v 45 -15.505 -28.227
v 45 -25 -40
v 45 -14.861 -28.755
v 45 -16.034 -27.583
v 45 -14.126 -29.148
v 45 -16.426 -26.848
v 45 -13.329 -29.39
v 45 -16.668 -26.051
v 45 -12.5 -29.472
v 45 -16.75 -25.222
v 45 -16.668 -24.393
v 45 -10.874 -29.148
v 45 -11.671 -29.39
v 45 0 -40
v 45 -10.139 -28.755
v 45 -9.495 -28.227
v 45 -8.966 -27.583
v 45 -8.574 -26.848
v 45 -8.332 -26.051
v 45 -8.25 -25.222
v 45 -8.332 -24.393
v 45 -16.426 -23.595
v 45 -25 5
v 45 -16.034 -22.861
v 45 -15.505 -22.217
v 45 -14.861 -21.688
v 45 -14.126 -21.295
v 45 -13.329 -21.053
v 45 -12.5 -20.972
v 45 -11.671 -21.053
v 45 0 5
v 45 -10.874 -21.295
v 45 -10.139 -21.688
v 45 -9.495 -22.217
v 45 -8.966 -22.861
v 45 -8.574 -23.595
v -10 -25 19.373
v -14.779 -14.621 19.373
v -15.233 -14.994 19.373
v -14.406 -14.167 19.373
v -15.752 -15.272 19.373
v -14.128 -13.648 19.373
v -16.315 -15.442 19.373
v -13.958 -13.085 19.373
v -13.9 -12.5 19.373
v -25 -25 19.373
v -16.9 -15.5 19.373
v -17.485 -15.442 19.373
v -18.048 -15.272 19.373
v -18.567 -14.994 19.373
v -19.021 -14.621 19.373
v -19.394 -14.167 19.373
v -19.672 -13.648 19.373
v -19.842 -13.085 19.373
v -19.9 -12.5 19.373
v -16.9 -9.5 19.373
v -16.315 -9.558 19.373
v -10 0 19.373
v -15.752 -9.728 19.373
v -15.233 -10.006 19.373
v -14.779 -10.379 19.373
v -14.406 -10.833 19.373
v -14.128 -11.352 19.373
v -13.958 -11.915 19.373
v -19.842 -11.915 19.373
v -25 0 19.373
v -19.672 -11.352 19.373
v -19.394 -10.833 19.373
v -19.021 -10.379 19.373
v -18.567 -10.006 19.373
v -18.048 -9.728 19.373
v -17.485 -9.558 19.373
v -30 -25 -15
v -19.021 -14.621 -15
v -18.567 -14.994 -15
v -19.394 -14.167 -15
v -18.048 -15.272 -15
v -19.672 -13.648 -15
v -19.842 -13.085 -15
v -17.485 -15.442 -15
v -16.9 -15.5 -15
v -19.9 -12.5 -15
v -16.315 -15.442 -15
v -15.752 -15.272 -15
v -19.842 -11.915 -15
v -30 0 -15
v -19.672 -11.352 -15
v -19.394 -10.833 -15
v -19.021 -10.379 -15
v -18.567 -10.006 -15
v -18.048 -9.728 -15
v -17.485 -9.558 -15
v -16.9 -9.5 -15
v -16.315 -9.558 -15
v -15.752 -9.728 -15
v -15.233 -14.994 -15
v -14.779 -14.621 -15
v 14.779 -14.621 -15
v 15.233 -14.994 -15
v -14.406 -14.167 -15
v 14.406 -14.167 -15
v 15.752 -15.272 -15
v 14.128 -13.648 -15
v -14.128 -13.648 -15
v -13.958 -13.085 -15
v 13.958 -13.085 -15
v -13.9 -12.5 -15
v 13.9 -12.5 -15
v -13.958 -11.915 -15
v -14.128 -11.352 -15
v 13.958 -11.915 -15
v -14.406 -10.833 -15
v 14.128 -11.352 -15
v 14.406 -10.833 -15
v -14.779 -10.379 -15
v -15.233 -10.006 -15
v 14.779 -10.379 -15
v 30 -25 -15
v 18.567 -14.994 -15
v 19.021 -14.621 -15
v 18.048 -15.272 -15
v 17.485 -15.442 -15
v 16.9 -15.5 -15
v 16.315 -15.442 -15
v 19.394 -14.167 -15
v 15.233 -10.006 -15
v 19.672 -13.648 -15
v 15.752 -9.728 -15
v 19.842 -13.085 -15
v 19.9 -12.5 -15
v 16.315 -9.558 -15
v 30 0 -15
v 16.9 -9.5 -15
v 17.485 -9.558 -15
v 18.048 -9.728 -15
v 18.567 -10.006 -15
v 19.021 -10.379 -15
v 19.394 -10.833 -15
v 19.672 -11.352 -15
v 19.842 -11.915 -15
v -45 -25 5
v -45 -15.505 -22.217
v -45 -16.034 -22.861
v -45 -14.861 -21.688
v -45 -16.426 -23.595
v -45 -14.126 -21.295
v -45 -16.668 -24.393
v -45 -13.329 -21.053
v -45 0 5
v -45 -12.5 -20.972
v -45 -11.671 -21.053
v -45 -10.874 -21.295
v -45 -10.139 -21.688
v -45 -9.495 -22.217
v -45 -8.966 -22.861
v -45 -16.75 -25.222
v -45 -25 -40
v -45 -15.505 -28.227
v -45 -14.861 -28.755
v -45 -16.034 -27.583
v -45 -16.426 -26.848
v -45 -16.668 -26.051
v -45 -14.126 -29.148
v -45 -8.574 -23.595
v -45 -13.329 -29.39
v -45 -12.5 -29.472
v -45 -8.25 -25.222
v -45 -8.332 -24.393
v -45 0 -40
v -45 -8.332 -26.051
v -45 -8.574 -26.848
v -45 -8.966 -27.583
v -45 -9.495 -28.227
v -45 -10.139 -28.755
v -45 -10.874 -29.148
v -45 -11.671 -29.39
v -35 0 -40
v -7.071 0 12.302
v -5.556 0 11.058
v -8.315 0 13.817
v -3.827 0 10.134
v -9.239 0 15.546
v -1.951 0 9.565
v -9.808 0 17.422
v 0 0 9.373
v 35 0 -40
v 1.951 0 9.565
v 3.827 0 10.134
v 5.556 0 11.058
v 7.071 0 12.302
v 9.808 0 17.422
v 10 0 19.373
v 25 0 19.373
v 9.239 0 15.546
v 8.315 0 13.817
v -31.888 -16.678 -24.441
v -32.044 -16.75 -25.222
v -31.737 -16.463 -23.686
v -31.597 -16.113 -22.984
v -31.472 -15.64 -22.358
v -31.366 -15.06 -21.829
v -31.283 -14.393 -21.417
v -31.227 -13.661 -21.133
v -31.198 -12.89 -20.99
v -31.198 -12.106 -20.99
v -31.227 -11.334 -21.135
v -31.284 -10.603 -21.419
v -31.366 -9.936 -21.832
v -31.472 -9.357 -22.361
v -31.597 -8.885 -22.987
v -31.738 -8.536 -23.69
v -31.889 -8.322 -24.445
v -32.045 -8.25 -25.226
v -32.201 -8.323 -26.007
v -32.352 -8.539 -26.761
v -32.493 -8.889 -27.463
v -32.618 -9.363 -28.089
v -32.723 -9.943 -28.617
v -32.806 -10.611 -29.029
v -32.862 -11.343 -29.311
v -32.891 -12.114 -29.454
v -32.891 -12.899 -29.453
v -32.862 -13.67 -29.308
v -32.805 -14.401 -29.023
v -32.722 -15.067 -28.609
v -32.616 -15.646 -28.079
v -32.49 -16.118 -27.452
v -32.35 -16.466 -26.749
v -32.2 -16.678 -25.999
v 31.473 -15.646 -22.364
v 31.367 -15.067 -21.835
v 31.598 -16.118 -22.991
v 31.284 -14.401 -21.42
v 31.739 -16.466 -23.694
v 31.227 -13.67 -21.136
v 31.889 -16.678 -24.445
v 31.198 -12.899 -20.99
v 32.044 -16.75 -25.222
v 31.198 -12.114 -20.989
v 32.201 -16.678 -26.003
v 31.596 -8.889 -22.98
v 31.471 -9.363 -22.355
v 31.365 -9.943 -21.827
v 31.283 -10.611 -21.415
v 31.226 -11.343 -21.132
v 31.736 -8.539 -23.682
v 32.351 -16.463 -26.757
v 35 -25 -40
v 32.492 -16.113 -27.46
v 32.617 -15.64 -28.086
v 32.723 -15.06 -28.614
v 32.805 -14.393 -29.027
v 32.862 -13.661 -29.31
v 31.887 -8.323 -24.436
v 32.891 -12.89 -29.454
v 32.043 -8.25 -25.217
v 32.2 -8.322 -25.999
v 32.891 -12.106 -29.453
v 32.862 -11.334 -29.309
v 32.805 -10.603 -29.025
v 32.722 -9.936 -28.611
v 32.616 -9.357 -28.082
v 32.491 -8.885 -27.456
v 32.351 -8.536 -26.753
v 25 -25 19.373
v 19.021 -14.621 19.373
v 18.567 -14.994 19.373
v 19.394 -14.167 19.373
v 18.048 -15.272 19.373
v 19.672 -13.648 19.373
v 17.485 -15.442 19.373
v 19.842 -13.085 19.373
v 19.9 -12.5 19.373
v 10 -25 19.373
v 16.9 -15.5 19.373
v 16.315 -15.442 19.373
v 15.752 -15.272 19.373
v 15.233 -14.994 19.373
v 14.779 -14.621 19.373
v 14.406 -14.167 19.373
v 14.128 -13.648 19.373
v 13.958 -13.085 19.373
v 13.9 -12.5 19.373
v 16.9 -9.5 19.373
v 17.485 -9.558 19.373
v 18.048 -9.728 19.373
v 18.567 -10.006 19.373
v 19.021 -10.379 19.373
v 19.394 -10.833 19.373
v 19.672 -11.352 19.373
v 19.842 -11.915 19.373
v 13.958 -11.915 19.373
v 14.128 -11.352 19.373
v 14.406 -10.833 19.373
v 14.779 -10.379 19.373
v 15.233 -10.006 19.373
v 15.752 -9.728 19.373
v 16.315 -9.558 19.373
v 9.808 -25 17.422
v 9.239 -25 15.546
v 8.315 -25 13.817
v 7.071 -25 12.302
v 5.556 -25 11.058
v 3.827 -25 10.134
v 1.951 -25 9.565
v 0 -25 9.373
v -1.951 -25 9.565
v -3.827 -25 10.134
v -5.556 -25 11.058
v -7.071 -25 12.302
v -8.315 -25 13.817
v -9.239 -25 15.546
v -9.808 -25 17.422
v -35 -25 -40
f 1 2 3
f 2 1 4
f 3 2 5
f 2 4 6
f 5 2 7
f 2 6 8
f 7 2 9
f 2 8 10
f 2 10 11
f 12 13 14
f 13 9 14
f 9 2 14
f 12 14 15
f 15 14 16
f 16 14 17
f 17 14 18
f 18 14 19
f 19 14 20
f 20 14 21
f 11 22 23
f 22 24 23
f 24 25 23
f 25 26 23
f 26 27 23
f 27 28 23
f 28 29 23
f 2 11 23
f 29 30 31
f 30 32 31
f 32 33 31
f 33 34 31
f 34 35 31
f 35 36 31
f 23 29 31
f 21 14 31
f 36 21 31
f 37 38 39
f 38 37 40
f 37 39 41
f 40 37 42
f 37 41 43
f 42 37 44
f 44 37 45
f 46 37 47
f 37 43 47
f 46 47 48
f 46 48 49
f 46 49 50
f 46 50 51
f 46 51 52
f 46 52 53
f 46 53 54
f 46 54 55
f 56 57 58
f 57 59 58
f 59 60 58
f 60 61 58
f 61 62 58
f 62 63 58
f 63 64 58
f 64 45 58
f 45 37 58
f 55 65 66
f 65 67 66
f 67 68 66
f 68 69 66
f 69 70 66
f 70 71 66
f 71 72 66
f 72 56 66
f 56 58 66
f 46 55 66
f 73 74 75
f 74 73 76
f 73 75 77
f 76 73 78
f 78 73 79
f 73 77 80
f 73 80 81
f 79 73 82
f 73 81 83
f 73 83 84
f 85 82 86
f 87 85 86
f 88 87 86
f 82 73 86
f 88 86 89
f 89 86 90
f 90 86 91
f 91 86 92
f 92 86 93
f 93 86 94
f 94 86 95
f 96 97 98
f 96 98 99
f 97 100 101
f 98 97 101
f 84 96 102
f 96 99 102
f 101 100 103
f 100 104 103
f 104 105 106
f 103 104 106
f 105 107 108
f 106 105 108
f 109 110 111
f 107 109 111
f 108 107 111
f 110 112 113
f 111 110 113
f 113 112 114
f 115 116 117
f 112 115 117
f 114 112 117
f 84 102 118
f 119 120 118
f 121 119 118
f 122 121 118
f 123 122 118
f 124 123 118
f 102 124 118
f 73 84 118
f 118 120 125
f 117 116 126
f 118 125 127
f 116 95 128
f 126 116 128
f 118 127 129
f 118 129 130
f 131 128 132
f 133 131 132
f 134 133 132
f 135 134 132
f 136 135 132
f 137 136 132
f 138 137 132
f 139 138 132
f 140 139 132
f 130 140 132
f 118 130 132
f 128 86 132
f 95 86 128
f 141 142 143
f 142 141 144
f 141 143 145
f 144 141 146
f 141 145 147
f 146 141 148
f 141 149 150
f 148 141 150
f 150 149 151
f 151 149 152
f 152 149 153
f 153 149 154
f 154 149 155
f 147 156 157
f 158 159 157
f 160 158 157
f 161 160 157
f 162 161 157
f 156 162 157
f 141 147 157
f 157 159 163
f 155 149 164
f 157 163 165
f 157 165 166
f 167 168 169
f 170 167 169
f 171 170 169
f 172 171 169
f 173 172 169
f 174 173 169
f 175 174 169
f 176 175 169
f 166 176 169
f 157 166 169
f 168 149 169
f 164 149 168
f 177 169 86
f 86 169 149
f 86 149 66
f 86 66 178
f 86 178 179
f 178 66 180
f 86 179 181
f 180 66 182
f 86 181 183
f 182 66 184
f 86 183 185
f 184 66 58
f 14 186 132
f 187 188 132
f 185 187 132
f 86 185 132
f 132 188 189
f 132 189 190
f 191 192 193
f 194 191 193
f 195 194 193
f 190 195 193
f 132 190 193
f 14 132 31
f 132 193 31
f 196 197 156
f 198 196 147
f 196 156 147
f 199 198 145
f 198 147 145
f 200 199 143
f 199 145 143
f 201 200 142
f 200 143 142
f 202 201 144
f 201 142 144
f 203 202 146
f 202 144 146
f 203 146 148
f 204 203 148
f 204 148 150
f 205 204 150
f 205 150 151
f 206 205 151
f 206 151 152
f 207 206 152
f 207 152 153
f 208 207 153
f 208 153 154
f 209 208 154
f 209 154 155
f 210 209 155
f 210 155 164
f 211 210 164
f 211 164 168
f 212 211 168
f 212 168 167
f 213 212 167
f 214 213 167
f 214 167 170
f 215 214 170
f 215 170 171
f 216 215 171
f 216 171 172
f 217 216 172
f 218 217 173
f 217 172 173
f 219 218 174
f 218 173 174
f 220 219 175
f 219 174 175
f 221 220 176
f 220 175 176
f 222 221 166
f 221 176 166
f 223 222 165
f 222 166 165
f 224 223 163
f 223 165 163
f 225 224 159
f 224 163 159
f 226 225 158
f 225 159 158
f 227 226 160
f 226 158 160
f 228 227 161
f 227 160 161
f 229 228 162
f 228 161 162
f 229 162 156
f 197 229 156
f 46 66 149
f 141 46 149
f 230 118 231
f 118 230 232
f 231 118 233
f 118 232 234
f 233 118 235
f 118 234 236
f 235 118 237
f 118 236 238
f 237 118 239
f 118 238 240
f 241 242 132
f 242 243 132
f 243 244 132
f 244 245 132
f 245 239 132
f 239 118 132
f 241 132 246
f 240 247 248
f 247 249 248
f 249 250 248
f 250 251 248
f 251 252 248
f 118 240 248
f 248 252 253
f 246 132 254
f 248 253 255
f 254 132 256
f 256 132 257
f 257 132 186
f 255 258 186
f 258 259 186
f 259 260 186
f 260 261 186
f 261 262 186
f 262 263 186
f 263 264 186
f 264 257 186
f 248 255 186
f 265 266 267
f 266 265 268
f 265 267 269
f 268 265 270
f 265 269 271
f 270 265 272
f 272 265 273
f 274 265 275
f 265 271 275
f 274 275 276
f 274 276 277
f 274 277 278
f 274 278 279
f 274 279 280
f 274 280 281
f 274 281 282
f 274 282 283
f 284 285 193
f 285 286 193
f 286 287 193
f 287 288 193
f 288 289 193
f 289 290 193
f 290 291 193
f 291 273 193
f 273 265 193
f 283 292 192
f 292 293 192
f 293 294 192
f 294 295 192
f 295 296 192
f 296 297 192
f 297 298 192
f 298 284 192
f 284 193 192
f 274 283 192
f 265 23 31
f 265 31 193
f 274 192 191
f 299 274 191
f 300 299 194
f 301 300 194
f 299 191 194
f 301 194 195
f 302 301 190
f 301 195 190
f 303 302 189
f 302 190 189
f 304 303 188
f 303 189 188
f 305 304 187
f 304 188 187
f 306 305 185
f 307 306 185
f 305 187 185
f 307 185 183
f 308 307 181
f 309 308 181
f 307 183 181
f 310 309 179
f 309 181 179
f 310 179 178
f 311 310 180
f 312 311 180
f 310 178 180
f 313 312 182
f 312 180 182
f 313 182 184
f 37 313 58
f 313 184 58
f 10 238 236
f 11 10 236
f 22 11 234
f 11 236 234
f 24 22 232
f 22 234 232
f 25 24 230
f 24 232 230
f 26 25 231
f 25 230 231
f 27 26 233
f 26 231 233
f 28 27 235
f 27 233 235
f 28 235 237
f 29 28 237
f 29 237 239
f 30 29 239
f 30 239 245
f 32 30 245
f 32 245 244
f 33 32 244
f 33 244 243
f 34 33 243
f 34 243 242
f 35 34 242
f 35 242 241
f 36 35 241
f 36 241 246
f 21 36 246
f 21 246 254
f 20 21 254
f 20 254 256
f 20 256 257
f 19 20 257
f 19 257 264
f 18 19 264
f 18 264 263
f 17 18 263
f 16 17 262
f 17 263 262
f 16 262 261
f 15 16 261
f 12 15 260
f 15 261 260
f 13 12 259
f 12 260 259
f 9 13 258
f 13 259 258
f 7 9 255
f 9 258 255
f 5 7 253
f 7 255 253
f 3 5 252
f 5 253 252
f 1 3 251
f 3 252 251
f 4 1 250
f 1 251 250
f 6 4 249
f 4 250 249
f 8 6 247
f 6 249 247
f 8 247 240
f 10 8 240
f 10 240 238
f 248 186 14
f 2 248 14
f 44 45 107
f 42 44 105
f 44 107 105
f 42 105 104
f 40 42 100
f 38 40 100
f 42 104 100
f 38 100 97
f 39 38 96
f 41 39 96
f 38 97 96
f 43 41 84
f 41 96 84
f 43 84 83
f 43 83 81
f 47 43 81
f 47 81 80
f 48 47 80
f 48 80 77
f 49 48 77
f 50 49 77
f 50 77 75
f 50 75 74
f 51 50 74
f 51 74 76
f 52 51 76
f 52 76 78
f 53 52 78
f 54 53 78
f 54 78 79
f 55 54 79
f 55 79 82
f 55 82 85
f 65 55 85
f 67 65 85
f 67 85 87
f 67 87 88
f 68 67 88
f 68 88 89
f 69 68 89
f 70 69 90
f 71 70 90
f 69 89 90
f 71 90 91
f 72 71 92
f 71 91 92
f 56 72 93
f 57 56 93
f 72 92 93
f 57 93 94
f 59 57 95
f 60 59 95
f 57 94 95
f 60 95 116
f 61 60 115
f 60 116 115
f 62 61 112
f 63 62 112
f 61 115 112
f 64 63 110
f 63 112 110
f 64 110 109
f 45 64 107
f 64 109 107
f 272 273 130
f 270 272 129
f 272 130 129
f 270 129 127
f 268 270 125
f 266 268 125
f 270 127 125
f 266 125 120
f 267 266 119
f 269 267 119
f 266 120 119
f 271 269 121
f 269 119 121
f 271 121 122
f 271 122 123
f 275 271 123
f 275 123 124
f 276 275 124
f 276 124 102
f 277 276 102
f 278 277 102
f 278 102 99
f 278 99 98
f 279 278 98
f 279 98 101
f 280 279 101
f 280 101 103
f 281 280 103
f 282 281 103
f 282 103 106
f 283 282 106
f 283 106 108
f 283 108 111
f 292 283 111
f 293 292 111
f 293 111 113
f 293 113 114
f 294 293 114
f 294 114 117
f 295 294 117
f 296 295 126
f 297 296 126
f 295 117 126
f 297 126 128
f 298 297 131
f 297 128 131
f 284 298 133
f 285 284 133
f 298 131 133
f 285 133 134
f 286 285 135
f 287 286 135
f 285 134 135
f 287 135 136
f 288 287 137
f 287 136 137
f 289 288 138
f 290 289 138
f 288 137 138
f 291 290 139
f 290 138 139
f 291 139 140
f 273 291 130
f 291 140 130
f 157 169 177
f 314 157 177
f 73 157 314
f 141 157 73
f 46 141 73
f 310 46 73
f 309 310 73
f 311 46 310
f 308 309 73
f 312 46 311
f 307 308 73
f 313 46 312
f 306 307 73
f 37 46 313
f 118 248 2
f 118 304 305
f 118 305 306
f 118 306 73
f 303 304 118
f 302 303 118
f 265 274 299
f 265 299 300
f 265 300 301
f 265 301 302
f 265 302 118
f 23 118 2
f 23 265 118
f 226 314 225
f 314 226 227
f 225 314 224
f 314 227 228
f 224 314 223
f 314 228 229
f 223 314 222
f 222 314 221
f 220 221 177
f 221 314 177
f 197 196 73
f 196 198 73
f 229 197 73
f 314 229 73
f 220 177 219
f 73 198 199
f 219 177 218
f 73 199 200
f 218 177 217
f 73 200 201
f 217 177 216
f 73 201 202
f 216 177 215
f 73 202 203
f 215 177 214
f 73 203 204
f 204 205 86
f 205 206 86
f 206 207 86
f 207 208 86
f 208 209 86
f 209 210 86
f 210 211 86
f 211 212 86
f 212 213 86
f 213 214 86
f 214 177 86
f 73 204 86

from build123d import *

# Parameters (mm, degrees)
F1_DEPTH = 25
F2_R     = 3
F3_DEPTH = 34.37407
F4_R     = 4.25
F5_DEPTH = 90.001


with BuildPart() as f1:
    # F0 (on Front) → F1 (new body)
    with BuildSketch(Plane.XZ):
        with BuildLine():
            Line((-25, 19.37307), (-45, 5))
            Line((-45, 5), (-45, 0))
            Line((-45, 0), (-45, -40))
            Line((-45, -40), (-35, -40))
            Line((-35, -40), (-30, -15))
            Line((-30, -15), (0, -15))
            Line((0, -15), (30, -15))
            Line((30, -15), (35, -40))
            Line((35, -40), (45, -40))
            Line((45, -40), (45, 0))
            Line((45, 0), (45, 5))
            Line((45, 5), (25, 19.37307))
            Line((25, 19.37307), (10, 19.37307))
            ThreePointArc((10, 19.37307), (0, 9.37307), (-10, 19.37307))
            Line((-10, 19.37307), (-25, 19.37307))
        make_face()
    extrude(amount=F1_DEPTH)

    # F2 (on face) → F3 (cut, through all)
    with BuildSketch(Plane(origin=(0, 0, -15), x_dir=(1, 0, 0), z_dir=(0, 0, -1))):
        with Locations((-16.9, 12.5)):
            Circle(F2_R)
        with Locations((16.9, 12.5)):
            Circle(F2_R)
    extrude(amount=-F3_DEPTH, mode=Mode.SUBTRACT)

    # F4 (on face) → F5 (cut, through all)
    with BuildSketch(Plane(origin=(-45, 0, 0), x_dir=(0, -1, 0), z_dir=(-1, 0, 0))):
        with Locations((12.5, -25.221726)):
            Circle(F4_R)
    extrude(amount=-F5_DEPTH, mode=Mode.SUBTRACT)


solid = f1.part
